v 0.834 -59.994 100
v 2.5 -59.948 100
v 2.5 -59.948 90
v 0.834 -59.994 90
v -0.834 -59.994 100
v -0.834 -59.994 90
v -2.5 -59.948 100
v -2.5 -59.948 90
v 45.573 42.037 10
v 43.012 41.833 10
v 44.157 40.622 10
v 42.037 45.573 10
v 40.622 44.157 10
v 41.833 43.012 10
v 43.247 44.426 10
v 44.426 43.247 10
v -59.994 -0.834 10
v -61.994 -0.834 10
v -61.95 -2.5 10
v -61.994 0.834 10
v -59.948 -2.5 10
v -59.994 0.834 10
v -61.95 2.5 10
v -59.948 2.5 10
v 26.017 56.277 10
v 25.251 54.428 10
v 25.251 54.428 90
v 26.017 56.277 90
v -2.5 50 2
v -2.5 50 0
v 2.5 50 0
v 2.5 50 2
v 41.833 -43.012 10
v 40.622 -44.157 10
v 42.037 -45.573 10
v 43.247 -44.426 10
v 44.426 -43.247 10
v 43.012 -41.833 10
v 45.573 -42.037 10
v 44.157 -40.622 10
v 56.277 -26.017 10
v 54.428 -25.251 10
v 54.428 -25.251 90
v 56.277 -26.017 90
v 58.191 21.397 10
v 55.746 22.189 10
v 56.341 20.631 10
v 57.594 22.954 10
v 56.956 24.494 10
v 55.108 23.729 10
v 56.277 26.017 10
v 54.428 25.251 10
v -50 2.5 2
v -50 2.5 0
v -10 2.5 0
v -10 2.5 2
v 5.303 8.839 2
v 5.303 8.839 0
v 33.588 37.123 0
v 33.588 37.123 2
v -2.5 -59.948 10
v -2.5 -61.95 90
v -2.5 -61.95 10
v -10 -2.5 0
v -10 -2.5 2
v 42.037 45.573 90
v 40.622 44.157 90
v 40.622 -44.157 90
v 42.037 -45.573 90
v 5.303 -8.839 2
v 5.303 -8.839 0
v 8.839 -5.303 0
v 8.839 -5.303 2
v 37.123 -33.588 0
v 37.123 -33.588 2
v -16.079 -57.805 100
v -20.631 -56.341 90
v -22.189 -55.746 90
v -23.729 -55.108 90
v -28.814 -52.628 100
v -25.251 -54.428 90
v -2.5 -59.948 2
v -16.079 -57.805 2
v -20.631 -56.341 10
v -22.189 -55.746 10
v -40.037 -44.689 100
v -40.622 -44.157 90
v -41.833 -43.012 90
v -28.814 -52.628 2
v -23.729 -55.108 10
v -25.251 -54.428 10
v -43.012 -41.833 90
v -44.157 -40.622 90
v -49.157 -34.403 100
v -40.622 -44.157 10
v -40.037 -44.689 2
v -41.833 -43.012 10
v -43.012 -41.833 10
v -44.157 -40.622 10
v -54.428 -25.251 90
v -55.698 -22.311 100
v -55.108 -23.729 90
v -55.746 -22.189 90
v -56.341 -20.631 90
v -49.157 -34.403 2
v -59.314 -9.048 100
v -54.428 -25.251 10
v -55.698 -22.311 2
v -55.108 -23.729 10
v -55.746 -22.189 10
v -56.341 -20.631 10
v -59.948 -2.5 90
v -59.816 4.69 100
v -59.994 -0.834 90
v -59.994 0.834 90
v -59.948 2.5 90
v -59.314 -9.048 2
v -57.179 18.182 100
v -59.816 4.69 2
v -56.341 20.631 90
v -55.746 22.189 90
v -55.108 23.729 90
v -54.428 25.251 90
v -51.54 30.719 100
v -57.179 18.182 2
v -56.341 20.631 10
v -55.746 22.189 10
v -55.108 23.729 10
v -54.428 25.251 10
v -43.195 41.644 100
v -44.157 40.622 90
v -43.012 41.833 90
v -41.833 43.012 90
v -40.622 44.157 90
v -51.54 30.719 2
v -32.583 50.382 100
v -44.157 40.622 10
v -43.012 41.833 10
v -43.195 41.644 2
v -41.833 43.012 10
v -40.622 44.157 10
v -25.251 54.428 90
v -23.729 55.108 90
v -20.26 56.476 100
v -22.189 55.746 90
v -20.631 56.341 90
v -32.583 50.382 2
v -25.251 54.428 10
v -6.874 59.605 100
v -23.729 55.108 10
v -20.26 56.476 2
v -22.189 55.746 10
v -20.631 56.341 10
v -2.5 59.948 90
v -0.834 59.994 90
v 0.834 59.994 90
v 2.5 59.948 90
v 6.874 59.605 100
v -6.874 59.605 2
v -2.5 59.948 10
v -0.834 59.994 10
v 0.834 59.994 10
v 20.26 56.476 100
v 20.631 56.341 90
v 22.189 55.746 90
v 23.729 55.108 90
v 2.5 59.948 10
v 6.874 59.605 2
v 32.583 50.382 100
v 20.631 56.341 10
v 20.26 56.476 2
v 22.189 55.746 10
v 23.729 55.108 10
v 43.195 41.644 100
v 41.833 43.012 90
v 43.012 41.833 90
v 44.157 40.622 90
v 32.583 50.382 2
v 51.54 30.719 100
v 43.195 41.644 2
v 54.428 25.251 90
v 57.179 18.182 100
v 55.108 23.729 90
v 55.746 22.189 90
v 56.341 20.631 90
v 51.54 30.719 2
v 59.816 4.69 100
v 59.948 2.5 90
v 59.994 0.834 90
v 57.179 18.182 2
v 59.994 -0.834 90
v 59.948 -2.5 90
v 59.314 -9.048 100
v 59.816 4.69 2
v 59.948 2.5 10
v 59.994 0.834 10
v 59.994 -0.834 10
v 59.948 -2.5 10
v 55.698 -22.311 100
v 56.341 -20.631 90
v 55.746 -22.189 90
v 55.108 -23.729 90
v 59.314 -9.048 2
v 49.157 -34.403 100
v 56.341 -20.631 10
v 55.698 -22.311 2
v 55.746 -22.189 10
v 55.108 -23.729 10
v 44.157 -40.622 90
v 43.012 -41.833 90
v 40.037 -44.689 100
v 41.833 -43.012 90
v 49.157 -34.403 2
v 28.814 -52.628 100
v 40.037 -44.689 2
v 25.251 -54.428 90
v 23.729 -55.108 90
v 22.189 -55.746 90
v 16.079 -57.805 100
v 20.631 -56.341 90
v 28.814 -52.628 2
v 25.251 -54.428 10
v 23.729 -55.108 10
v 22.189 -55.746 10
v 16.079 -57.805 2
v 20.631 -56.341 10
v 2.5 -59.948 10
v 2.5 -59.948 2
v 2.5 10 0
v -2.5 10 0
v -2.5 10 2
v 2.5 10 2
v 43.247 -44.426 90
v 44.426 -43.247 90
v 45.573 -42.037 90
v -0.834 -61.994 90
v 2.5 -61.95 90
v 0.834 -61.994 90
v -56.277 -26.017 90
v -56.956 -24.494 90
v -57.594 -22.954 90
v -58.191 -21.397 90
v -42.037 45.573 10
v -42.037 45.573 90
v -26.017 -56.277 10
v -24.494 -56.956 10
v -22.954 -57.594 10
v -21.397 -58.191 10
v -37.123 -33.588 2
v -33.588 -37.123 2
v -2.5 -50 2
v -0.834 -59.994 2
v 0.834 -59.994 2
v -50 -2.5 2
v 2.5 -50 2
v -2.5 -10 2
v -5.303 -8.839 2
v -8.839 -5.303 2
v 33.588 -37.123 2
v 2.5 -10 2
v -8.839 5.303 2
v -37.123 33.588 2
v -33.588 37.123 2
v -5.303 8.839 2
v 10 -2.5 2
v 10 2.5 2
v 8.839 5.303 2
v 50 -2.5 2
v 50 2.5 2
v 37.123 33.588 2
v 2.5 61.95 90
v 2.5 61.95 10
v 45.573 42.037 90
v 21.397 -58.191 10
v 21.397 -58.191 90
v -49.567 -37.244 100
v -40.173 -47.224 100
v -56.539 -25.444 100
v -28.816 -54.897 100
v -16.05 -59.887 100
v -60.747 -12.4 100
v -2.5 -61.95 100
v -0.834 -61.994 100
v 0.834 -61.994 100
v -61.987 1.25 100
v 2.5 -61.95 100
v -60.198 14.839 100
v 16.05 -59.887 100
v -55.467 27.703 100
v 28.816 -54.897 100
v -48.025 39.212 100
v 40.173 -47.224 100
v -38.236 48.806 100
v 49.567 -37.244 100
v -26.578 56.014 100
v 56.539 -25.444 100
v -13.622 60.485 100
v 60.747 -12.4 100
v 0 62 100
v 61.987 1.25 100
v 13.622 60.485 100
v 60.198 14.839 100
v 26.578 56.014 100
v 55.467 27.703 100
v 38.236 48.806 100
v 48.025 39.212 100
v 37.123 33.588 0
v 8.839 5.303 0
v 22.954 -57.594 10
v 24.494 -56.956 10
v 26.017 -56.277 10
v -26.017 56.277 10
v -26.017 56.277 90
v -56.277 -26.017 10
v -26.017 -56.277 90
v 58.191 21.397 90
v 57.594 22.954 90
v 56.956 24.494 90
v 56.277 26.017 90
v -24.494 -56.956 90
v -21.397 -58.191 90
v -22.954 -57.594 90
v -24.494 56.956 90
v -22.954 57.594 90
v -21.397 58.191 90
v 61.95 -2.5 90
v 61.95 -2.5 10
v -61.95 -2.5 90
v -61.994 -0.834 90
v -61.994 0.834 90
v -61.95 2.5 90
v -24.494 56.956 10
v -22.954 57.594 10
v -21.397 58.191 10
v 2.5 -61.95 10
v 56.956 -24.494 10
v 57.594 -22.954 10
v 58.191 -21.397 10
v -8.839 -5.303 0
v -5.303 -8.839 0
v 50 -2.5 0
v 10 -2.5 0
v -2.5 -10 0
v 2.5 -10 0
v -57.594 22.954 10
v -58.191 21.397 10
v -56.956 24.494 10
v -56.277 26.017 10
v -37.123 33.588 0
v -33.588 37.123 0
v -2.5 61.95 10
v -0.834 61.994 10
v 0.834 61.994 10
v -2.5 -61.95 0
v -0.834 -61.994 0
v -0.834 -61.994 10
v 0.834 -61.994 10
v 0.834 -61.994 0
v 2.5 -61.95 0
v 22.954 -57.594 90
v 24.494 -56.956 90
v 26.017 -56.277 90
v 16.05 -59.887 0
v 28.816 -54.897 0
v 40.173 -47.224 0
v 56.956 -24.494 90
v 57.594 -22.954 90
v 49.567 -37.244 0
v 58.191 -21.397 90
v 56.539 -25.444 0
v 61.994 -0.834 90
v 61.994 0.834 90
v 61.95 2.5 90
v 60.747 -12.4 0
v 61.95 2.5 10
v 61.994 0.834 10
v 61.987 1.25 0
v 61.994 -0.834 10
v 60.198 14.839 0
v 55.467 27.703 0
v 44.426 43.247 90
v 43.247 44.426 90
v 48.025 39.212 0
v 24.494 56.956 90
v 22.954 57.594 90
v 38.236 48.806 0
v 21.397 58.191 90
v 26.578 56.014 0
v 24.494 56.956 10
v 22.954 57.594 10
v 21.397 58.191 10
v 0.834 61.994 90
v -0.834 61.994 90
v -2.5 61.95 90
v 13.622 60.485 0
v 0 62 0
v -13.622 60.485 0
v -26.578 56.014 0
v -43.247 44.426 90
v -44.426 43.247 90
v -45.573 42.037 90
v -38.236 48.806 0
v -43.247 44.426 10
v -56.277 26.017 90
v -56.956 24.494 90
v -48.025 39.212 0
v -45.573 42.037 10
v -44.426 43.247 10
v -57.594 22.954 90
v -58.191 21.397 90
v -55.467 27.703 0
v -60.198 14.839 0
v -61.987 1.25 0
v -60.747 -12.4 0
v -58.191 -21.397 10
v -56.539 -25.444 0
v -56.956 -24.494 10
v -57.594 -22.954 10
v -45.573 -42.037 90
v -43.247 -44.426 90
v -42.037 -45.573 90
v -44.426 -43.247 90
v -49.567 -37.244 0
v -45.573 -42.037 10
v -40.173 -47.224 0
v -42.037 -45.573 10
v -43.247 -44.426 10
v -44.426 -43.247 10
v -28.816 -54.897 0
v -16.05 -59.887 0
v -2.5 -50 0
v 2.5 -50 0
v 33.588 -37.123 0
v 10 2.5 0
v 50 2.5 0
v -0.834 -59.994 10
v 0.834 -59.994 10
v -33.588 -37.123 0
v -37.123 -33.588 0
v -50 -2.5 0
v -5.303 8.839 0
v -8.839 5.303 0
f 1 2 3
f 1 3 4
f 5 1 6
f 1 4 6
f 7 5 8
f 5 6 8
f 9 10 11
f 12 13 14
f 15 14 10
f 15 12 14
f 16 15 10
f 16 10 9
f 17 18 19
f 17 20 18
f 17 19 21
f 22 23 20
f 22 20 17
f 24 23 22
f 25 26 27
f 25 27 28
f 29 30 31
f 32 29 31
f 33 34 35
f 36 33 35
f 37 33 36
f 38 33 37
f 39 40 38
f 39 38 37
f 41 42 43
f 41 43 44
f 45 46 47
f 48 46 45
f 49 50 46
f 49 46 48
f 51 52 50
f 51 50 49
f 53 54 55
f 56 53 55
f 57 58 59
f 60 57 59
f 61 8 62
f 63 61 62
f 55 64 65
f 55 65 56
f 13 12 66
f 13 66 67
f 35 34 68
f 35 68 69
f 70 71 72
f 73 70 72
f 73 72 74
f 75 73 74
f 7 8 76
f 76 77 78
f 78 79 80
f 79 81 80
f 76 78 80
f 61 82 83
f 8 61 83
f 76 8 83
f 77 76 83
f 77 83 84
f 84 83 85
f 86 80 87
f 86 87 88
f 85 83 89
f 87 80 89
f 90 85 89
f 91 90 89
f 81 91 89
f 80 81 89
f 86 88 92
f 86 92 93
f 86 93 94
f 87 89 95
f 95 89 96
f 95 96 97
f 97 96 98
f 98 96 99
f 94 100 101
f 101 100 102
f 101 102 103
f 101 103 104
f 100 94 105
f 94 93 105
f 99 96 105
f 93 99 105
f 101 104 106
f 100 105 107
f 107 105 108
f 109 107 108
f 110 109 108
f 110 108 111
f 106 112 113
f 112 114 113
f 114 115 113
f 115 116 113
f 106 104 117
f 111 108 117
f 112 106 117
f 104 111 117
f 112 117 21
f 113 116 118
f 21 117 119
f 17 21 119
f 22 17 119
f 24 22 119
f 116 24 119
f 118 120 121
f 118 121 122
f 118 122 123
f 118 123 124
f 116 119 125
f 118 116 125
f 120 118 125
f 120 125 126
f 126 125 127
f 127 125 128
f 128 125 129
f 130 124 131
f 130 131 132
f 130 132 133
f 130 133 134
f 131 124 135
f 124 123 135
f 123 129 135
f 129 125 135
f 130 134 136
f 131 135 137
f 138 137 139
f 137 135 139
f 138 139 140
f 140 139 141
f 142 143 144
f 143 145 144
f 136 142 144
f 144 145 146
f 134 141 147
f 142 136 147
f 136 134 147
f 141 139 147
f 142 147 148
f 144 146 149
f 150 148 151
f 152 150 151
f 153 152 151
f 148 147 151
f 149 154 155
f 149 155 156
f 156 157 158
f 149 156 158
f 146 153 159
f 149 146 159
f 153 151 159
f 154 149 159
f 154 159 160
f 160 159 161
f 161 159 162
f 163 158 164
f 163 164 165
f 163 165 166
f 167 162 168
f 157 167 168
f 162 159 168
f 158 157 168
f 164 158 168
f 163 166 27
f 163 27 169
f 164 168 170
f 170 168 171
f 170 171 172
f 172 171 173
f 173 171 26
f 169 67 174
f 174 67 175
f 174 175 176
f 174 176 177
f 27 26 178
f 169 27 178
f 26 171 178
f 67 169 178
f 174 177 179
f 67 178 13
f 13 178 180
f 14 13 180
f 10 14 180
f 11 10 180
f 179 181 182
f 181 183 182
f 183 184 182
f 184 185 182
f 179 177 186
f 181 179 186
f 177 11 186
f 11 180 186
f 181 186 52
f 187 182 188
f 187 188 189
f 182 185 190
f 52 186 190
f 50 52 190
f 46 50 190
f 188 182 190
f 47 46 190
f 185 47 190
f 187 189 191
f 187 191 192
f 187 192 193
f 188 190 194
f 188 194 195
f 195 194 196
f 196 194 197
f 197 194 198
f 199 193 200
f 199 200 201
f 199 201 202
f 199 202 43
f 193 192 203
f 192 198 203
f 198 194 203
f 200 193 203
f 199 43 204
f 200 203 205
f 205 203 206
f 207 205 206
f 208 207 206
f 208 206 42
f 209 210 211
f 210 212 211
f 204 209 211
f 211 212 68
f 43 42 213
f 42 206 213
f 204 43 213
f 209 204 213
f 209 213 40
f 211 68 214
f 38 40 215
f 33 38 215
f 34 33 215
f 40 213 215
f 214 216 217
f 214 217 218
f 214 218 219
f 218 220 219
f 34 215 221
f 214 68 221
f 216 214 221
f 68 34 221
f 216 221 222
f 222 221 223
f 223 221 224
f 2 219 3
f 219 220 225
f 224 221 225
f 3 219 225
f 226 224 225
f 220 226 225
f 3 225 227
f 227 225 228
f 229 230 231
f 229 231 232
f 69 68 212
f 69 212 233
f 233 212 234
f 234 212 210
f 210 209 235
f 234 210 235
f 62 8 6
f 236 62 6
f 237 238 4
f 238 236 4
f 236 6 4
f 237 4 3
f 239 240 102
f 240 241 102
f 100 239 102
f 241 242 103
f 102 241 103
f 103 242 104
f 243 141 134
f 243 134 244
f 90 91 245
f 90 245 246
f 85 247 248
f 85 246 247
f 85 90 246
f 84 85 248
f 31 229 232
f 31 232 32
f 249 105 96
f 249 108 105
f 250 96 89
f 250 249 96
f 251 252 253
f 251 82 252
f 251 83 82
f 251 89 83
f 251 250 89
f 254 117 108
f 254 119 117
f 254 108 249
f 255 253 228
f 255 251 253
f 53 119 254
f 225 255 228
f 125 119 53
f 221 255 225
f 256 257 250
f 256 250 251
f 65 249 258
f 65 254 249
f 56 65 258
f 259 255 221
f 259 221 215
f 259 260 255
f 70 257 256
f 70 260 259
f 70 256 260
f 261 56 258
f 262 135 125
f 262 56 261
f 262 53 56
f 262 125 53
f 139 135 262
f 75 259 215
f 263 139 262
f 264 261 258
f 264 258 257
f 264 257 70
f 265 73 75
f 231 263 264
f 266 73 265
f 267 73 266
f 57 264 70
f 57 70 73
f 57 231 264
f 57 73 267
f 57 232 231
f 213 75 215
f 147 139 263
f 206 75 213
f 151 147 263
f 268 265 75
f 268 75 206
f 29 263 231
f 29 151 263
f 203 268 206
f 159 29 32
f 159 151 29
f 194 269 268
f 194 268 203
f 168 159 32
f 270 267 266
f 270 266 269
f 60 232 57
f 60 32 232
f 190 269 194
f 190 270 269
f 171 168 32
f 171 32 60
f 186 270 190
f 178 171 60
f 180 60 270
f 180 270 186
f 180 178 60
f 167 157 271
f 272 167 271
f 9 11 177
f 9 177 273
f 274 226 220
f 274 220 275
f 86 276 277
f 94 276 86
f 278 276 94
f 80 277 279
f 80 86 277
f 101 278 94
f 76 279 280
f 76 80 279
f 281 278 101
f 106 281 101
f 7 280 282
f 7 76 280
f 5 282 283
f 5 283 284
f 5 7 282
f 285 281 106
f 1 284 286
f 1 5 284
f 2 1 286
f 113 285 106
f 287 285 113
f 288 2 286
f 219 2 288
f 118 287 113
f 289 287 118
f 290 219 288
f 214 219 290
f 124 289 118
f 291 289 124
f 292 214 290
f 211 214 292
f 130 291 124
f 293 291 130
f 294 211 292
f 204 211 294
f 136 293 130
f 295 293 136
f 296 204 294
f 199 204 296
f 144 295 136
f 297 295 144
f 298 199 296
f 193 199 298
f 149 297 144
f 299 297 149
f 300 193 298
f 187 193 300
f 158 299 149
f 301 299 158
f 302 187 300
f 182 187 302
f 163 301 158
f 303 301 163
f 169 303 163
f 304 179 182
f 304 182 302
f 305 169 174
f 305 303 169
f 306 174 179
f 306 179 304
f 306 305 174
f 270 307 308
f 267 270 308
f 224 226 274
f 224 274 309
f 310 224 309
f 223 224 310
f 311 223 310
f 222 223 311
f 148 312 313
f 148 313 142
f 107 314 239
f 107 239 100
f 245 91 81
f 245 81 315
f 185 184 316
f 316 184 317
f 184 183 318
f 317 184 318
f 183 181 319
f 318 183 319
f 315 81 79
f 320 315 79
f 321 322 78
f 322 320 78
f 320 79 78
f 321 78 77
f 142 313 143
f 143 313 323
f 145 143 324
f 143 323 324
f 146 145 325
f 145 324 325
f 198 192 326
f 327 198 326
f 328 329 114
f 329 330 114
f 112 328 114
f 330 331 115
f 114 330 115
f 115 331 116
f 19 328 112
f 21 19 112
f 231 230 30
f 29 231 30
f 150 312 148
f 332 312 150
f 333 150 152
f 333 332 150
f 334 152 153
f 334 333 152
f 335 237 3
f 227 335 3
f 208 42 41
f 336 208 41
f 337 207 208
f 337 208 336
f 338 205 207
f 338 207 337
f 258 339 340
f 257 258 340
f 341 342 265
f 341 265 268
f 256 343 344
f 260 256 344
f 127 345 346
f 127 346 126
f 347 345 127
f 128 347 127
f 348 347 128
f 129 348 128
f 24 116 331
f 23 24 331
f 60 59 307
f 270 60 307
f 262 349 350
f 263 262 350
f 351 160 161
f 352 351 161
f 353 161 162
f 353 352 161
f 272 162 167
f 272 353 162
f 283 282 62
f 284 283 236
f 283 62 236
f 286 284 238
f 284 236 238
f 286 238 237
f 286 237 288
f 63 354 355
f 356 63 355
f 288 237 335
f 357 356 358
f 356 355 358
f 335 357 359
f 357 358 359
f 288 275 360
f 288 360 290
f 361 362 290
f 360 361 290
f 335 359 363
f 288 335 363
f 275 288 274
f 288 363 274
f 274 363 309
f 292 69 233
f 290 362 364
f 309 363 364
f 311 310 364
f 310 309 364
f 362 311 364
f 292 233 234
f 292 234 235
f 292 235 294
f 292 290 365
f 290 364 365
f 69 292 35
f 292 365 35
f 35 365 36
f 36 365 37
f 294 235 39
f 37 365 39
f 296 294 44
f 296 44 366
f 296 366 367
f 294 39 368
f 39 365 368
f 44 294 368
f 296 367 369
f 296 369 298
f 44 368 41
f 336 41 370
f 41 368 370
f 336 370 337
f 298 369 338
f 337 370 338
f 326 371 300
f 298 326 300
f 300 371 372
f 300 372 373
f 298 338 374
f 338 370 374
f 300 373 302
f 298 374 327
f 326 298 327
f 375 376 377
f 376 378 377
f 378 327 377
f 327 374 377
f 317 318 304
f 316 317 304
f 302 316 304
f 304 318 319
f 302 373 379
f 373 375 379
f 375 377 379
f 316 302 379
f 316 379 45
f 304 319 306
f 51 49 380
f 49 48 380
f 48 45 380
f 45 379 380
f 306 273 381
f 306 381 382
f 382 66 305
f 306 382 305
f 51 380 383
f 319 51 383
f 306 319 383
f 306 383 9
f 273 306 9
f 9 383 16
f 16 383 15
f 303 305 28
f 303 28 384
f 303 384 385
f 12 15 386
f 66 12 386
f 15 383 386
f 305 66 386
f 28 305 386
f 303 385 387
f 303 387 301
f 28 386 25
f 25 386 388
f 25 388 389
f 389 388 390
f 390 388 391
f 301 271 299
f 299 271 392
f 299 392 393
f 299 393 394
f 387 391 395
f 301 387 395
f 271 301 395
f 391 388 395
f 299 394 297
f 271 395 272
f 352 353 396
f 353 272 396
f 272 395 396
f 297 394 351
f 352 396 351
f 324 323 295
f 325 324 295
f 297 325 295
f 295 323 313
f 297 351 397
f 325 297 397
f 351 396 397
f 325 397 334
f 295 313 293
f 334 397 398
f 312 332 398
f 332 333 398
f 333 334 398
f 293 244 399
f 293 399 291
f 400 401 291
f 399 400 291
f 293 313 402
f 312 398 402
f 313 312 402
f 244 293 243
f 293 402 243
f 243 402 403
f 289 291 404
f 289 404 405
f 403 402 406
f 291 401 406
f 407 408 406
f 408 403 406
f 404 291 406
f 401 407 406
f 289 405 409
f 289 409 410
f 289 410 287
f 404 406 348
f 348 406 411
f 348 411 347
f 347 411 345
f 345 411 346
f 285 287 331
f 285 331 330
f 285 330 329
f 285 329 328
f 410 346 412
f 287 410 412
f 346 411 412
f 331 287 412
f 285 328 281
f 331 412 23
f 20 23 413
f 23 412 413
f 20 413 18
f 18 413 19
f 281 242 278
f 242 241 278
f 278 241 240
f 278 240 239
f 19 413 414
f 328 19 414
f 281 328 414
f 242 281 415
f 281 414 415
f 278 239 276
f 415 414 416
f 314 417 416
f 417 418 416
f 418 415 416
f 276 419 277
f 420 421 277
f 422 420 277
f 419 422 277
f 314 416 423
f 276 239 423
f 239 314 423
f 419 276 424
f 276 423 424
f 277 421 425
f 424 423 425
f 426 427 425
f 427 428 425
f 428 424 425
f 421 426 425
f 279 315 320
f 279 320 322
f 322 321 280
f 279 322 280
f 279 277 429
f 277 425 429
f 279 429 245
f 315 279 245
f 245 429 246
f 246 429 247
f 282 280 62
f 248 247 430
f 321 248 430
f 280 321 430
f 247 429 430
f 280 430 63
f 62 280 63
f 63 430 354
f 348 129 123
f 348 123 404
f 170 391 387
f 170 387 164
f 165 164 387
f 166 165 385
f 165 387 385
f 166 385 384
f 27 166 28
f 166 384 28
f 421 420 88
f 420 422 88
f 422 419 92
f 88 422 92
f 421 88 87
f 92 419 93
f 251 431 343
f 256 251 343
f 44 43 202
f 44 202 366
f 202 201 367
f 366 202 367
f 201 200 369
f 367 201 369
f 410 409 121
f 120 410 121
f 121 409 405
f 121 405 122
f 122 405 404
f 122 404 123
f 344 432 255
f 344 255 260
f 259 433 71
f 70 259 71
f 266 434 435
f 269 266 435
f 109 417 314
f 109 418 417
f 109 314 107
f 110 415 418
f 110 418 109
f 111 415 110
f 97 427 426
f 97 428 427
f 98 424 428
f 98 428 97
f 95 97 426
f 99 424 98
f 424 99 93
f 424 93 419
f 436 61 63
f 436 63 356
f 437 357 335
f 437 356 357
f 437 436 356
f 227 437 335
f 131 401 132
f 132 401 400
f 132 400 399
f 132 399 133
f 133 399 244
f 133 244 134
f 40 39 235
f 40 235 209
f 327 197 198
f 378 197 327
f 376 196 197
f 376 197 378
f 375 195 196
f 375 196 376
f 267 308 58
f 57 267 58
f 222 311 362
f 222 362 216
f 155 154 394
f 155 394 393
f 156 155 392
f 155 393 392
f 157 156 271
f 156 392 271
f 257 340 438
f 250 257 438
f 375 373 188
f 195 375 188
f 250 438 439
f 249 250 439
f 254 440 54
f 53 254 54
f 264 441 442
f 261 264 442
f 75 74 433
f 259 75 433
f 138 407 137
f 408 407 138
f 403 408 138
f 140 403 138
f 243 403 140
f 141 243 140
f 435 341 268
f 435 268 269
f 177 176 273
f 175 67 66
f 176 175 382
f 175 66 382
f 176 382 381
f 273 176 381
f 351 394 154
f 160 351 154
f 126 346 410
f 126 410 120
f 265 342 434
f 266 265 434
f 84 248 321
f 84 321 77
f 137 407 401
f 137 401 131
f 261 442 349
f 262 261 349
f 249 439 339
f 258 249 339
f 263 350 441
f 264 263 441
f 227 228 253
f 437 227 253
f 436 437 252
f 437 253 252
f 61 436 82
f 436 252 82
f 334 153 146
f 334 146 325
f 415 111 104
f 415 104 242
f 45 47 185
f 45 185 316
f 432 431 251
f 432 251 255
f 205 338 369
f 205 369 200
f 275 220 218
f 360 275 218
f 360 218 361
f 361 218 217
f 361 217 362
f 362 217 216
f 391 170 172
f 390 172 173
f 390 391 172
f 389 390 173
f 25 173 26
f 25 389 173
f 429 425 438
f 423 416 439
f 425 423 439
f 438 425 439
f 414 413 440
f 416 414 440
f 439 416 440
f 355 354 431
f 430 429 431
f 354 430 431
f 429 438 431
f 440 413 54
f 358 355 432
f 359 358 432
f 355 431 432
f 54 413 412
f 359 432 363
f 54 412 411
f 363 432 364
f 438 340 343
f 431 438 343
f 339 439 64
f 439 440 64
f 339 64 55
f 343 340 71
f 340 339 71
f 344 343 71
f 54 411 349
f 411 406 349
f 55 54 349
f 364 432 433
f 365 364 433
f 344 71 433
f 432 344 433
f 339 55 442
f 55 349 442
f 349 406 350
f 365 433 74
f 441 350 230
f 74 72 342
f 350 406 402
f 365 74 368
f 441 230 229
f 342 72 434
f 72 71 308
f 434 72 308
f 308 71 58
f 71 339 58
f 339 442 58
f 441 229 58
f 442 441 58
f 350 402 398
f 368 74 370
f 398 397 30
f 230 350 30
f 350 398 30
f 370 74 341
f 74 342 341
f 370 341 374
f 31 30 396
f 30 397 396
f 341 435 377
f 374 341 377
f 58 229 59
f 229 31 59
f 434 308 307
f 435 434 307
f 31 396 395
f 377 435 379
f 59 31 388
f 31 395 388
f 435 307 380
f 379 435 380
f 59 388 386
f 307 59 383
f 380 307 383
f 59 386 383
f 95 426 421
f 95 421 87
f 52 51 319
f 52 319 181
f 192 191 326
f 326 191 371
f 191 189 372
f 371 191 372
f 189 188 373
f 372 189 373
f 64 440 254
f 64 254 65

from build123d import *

# Parameters (mm, degrees)
F0_W     = 5
F0_H     = 40
F0_W_2   = 40
F0_H_2   = 5
F1_DEPTH = 2
F2_DEPTH = 100
F5_DEPTH = 80


with BuildPart() as f1:
    # F0 (on Top) → F1 (new body)
    with BuildSketch(Plane.XY):
        with BuildLine():
            ThreePointArc((2.5, -59.9478940414), (43.3012701892, -41.5331193146), (60, 0))
            ThreePointArc((60, 0), (-41.5331193146, 43.3012701892), (-2.5, -59.9478940414))
            ThreePointArc((-2.5, -59.9478940414), (0, -60), (2.5, -59.9478940414))
        make_face()
        Polygon((-8.8388347648, -5.3033008589), (-5.3033008589, -8.8388347648), (-33.5875721064, -37.1231060123), (-37.1231060123, -33.5875721064), align=None, mode=Mode.SUBTRACT)
        with Locations((0, -30)):
            Rectangle(F0_W, F0_H, mode=Mode.SUBTRACT)
        Polygon((5.3033008589, -8.8388347648), (8.8388347648, -5.3033008589), (37.1231060123, -33.5875721064), (33.5875721064, -37.1231060123), align=None, mode=Mode.SUBTRACT)
        with Locations((-30, 0)):
            Rectangle(F0_W_2, F0_H_2, mode=Mode.SUBTRACT)
        Polygon((-5.3033008589, 8.8388347648), (-8.8388347648, 5.3033008589), (-37.1231060123, 33.5875721064), (-33.5875721064, 37.1231060123), align=None, mode=Mode.SUBTRACT)
        with Locations((30, 0)):
            Rectangle(F0_W_2, F0_H_2, mode=Mode.SUBTRACT)
        with Locations((0, 30)):
            Rectangle(F0_W, F0_H, mode=Mode.SUBTRACT)
        Polygon((8.8388347648, 5.3033008589), (5.3033008589, 8.8388347648), (33.5875721064, 37.1231060123), (37.1231060123, 33.5875721064), align=None, mode=Mode.SUBTRACT)
        with BuildLine():
            ThreePointArc((2.5, -59.9478940414), (0, -60), (-2.5, -59.9478940414))
            Line((-2.5, -59.9478940414), (-2.5, -61.9495762697))
            ThreePointArc((-2.5, -61.9495762697), (0, -62), (2.5, -61.9495762697))
            Line((2.5, -61.9495762697), (2.5, -59.9478940414))
        make_face()
        with BuildLine():
            ThreePointArc((-2.5, -59.9478940414), (-41.5331193146, 43.3012701892), (60, 0))
            ThreePointArc((60, 0), (43.3012701892, -41.5331193146), (2.5, -59.9478940414))
            Line((2.5, -59.9478940414), (2.5, -61.9495762697))
            ThreePointArc((2.5, -61.9495762697), (44.7157690306, -42.947642543), (62, 0))
            ThreePointArc((62, 0), (-42.947642543, 44.7157690306), (-2.5, -61.9495762697))
            Line((-2.5, -61.9495762697), (-2.5, -59.9478940414))
        make_face()
    extrude(amount=F1_DEPTH)

    # F0 (on Top) → F2 (join)
    with BuildSketch(Plane.XY):
        with BuildLine():
            ThreePointArc((2.5, -59.9478940414), (0, -60), (-2.5, -59.9478940414))
            Line((-2.5, -59.9478940414), (-2.5, -61.9495762697))
            ThreePointArc((-2.5, -61.9495762697), (0, -62), (2.5, -61.9495762697))
            Line((2.5, -61.9495762697), (2.5, -59.9478940414))
        make_face()
        with BuildLine():
            ThreePointArc((-2.5, -59.9478940414), (-41.5331193146, 43.3012701892), (60, 0))
            ThreePointArc((60, 0), (43.3012701892, -41.5331193146), (2.5, -59.9478940414))
            Line((2.5, -59.9478940414), (2.5, -61.9495762697))
            ThreePointArc((2.5, -61.9495762697), (44.7157690306, -42.947642543), (62, 0))
            ThreePointArc((62, 0), (-42.947642543, 44.7157690306), (-2.5, -61.9495762697))
            Line((-2.5, -61.9495762697), (-2.5, -59.9478940414))
        make_face()
    extrude(amount=F2_DEPTH)

    # F4 (on offset) → F5 (cut)
    with BuildSketch(Plane.XY.offset(10)):
        with BuildLine():
            ThreePointArc((2.5, -59.9478940414), (0, -59.80692448), (-2.5, -59.9478940414))
            Line((-2.5, -59.9478940414), (-2.5, -61.9495762697))
            ThreePointArc((-2.5, -61.9495762697), (0, -62.078494201), (2.5, -61.9495762697))
            Line((2.5, -61.9495762697), (2.5, -59.9478940414))
        make_face()
        with BuildLine():
            Line((-25.2507646861, -54.4279237411), (-26.0167753117, -56.2772369824))
            ThreePointArc((-26.0167753117, -56.2772369824), (-23.7564112369, -57.3530502014), (-21.3973776492, -58.1906541443))
            Line((-21.3973776492, -58.1906541443), (-20.6313670235, -56.3413409029))
            ThreePointArc((-20.6313670235, -56.3413409029), (-22.8871191392, -55.2543934295), (-25.2507646861, -54.4279237411))
        make_face()
        with BuildLine():
            Line((-44.1573293475, -40.6217954416), (-45.5727324249, -42.037198519))
            ThreePointArc((-45.5727324249, -42.037198519), (-43.8961242154, -43.8961242154), (-42.037198519, -45.5727324249))
            Line((-42.037198519, -45.5727324249), (-40.6217954416, -44.1573293475))
            ThreePointArc((-40.6217954416, -44.1573293475), (-42.2898818617, -42.2898818617), (-44.1573293475, -40.6217954416))
        make_face()
        with BuildLine():
            Line((-56.3413409029, -20.6313670235), (-58.1906541443, -21.3973776492))
            ThreePointArc((-58.1906541443, -21.3973776492), (-57.3530502014, -23.7564112369), (-56.2772369824, -26.0167753117))
            Line((-56.2772369824, -26.0167753117), (-54.4279237411, -25.2507646861))
            ThreePointArc((-54.4279237411, -25.2507646861), (-55.2543934295, -22.8871191392), (-56.3413409029, -20.6313670235))
        make_face()
        with BuildLine():
            Line((-59.9478940414, 2.5), (-61.9495762697, 2.5))
            ThreePointArc((-61.9495762697, 2.5), (-62.078494201, 0), (-61.9495762697, -2.5))
            Line((-61.9495762697, -2.5), (-59.9478940414, -2.5))
            ThreePointArc((-59.9478940414, -2.5), (-59.80692448, 0), (-59.9478940414, 2.5))
        make_face()
        with BuildLine():
            Line((20.6313670235, -56.3413409029), (21.3973776492, -58.1906541443))
            ThreePointArc((21.3973776492, -58.1906541443), (23.7564112369, -57.3530502014), (26.0167753117, -56.2772369824))
            Line((26.0167753117, -56.2772369824), (25.2507646861, -54.4279237411))
            ThreePointArc((25.2507646861, -54.4279237411), (22.8871191392, -55.2543934295), (20.6313670235, -56.3413409029))
        make_face()
        with BuildLine():
            Line((40.6217954416, -44.1573293475), (42.037198519, -45.5727324249))
            ThreePointArc((42.037198519, -45.5727324249), (43.8961242154, -43.8961242154), (45.5727324249, -42.037198519))
            Line((45.5727324249, -42.037198519), (44.1573293475, -40.6217954416))
            ThreePointArc((44.1573293475, -40.6217954416), (42.2898818617, -42.2898818617), (40.6217954416, -44.1573293475))
        make_face()
        with BuildLine():
            Line((54.4279237411, -25.2507646861), (56.2772369824, -26.0167753117))
            ThreePointArc((56.2772369824, -26.0167753117), (57.3530502014, -23.7564112369), (58.1906541443, -21.3973776492))
            Line((58.1906541443, -21.3973776492), (56.3413409029, -20.6313670235))
            ThreePointArc((56.3413409029, -20.6313670235), (55.2543934295, -22.8871191392), (54.4279237411, -25.2507646861))
        make_face()
        with BuildLine():
            Line((56.3413409029, 20.6313670235), (58.1906541443, 21.3973776492))
            ThreePointArc((58.1906541443, 21.3973776492), (57.3530502014, 23.7564112369), (56.2772369824, 26.0167753117))
            Line((56.2772369824, 26.0167753117), (54.4279237411, 25.2507646861))
            ThreePointArc((54.4279237411, 25.2507646861), (55.2543934295, 22.8871191392), (56.3413409029, 20.6313670235))
        make_face()
        with BuildLine():
            Line((44.1573293475, 40.6217954416), (45.5727324249, 42.037198519))
            ThreePointArc((45.5727324249, 42.037198519), (43.8961242154, 43.8961242154), (42.037198519, 45.5727324249))
            Line((42.037198519, 45.5727324249), (40.6217954416, 44.1573293475))
            ThreePointArc((40.6217954416, 44.1573293475), (42.2898818617, 42.2898818617), (44.1573293475, 40.6217954416))
        make_face()
        with BuildLine():
            Line((25.2507646861, 54.4279237411), (26.0167753117, 56.2772369824))
            ThreePointArc((26.0167753117, 56.2772369824), (23.7564112369, 57.3530502014), (21.3973776492, 58.1906541443))
            Line((21.3973776492, 58.1906541443), (20.6313670235, 56.3413409029))
            ThreePointArc((20.6313670235, 56.3413409029), (22.8871191392, 55.2543934295), (25.2507646861, 54.4279237411))
        make_face()
        with BuildLine():
            Line((2.5, 59.9478940414), (2.5, 61.9495762697))
            ThreePointArc((2.5, 61.9495762697), (0, 62.078494201), (-2.5, 61.9495762697))
            Line((-2.5, 61.9495762697), (-2.5, 59.9478940414))
            ThreePointArc((-2.5, 59.9478940414), (0, 59.80692448), (2.5, 59.9478940414))
        make_face()
        with BuildLine():
            Line((-20.6313670235, 56.3413409029), (-21.3973776492, 58.1906541443))
            ThreePointArc((-21.3973776492, 58.1906541443), (-23.7564112369, 57.3530502014), (-26.0167753117, 56.2772369824))
            Line((-26.0167753117, 56.2772369824), (-25.2507646861, 54.4279237411))
            ThreePointArc((-25.2507646861, 54.4279237411), (-22.8871191392, 55.2543934295), (-20.6313670235, 56.3413409029))
        make_face()
        with BuildLine():
            Line((-54.4279237411, 25.2507646861), (-56.2772369824, 26.0167753117))
            ThreePointArc((-56.2772369824, 26.0167753117), (-57.3530502014, 23.7564112369), (-58.1906541443, 21.3973776492))
            Line((-58.1906541443, 21.3973776492), (-56.3413409029, 20.6313670235))
            ThreePointArc((-56.3413409029, 20.6313670235), (-55.2543934295, 22.8871191392), (-54.4279237411, 25.2507646861))
        make_face()
        with BuildLine():
            Line((-40.6217954416, 44.1573293475), (-42.037198519, 45.5727324249))
            ThreePointArc((-42.037198519, 45.5727324249), (-43.8961242154, 43.8961242154), (-45.5727324249, 42.037198519))
            Line((-45.5727324249, 42.037198519), (-44.1573293475, 40.6217954416))
            ThreePointArc((-44.1573293475, 40.6217954416), (-42.2898818617, 42.2898818617), (-40.6217954416, 44.1573293475))
        make_face()
        with BuildLine():
            Line((59.9478940414, -2.5), (61.9495762697, -2.5))
            ThreePointArc((61.9495762697, -2.5), (62.078494201, 0), (61.9495762697, 2.5))
            Line((61.9495762697, 2.5), (59.9478940414, 2.5))
            ThreePointArc((59.9478940414, 2.5), (59.80692448, 0), (59.9478940414, -2.5))
        make_face()
    extrude(amount=F5_DEPTH, mode=Mode.SUBTRACT)


solid = f1.part
